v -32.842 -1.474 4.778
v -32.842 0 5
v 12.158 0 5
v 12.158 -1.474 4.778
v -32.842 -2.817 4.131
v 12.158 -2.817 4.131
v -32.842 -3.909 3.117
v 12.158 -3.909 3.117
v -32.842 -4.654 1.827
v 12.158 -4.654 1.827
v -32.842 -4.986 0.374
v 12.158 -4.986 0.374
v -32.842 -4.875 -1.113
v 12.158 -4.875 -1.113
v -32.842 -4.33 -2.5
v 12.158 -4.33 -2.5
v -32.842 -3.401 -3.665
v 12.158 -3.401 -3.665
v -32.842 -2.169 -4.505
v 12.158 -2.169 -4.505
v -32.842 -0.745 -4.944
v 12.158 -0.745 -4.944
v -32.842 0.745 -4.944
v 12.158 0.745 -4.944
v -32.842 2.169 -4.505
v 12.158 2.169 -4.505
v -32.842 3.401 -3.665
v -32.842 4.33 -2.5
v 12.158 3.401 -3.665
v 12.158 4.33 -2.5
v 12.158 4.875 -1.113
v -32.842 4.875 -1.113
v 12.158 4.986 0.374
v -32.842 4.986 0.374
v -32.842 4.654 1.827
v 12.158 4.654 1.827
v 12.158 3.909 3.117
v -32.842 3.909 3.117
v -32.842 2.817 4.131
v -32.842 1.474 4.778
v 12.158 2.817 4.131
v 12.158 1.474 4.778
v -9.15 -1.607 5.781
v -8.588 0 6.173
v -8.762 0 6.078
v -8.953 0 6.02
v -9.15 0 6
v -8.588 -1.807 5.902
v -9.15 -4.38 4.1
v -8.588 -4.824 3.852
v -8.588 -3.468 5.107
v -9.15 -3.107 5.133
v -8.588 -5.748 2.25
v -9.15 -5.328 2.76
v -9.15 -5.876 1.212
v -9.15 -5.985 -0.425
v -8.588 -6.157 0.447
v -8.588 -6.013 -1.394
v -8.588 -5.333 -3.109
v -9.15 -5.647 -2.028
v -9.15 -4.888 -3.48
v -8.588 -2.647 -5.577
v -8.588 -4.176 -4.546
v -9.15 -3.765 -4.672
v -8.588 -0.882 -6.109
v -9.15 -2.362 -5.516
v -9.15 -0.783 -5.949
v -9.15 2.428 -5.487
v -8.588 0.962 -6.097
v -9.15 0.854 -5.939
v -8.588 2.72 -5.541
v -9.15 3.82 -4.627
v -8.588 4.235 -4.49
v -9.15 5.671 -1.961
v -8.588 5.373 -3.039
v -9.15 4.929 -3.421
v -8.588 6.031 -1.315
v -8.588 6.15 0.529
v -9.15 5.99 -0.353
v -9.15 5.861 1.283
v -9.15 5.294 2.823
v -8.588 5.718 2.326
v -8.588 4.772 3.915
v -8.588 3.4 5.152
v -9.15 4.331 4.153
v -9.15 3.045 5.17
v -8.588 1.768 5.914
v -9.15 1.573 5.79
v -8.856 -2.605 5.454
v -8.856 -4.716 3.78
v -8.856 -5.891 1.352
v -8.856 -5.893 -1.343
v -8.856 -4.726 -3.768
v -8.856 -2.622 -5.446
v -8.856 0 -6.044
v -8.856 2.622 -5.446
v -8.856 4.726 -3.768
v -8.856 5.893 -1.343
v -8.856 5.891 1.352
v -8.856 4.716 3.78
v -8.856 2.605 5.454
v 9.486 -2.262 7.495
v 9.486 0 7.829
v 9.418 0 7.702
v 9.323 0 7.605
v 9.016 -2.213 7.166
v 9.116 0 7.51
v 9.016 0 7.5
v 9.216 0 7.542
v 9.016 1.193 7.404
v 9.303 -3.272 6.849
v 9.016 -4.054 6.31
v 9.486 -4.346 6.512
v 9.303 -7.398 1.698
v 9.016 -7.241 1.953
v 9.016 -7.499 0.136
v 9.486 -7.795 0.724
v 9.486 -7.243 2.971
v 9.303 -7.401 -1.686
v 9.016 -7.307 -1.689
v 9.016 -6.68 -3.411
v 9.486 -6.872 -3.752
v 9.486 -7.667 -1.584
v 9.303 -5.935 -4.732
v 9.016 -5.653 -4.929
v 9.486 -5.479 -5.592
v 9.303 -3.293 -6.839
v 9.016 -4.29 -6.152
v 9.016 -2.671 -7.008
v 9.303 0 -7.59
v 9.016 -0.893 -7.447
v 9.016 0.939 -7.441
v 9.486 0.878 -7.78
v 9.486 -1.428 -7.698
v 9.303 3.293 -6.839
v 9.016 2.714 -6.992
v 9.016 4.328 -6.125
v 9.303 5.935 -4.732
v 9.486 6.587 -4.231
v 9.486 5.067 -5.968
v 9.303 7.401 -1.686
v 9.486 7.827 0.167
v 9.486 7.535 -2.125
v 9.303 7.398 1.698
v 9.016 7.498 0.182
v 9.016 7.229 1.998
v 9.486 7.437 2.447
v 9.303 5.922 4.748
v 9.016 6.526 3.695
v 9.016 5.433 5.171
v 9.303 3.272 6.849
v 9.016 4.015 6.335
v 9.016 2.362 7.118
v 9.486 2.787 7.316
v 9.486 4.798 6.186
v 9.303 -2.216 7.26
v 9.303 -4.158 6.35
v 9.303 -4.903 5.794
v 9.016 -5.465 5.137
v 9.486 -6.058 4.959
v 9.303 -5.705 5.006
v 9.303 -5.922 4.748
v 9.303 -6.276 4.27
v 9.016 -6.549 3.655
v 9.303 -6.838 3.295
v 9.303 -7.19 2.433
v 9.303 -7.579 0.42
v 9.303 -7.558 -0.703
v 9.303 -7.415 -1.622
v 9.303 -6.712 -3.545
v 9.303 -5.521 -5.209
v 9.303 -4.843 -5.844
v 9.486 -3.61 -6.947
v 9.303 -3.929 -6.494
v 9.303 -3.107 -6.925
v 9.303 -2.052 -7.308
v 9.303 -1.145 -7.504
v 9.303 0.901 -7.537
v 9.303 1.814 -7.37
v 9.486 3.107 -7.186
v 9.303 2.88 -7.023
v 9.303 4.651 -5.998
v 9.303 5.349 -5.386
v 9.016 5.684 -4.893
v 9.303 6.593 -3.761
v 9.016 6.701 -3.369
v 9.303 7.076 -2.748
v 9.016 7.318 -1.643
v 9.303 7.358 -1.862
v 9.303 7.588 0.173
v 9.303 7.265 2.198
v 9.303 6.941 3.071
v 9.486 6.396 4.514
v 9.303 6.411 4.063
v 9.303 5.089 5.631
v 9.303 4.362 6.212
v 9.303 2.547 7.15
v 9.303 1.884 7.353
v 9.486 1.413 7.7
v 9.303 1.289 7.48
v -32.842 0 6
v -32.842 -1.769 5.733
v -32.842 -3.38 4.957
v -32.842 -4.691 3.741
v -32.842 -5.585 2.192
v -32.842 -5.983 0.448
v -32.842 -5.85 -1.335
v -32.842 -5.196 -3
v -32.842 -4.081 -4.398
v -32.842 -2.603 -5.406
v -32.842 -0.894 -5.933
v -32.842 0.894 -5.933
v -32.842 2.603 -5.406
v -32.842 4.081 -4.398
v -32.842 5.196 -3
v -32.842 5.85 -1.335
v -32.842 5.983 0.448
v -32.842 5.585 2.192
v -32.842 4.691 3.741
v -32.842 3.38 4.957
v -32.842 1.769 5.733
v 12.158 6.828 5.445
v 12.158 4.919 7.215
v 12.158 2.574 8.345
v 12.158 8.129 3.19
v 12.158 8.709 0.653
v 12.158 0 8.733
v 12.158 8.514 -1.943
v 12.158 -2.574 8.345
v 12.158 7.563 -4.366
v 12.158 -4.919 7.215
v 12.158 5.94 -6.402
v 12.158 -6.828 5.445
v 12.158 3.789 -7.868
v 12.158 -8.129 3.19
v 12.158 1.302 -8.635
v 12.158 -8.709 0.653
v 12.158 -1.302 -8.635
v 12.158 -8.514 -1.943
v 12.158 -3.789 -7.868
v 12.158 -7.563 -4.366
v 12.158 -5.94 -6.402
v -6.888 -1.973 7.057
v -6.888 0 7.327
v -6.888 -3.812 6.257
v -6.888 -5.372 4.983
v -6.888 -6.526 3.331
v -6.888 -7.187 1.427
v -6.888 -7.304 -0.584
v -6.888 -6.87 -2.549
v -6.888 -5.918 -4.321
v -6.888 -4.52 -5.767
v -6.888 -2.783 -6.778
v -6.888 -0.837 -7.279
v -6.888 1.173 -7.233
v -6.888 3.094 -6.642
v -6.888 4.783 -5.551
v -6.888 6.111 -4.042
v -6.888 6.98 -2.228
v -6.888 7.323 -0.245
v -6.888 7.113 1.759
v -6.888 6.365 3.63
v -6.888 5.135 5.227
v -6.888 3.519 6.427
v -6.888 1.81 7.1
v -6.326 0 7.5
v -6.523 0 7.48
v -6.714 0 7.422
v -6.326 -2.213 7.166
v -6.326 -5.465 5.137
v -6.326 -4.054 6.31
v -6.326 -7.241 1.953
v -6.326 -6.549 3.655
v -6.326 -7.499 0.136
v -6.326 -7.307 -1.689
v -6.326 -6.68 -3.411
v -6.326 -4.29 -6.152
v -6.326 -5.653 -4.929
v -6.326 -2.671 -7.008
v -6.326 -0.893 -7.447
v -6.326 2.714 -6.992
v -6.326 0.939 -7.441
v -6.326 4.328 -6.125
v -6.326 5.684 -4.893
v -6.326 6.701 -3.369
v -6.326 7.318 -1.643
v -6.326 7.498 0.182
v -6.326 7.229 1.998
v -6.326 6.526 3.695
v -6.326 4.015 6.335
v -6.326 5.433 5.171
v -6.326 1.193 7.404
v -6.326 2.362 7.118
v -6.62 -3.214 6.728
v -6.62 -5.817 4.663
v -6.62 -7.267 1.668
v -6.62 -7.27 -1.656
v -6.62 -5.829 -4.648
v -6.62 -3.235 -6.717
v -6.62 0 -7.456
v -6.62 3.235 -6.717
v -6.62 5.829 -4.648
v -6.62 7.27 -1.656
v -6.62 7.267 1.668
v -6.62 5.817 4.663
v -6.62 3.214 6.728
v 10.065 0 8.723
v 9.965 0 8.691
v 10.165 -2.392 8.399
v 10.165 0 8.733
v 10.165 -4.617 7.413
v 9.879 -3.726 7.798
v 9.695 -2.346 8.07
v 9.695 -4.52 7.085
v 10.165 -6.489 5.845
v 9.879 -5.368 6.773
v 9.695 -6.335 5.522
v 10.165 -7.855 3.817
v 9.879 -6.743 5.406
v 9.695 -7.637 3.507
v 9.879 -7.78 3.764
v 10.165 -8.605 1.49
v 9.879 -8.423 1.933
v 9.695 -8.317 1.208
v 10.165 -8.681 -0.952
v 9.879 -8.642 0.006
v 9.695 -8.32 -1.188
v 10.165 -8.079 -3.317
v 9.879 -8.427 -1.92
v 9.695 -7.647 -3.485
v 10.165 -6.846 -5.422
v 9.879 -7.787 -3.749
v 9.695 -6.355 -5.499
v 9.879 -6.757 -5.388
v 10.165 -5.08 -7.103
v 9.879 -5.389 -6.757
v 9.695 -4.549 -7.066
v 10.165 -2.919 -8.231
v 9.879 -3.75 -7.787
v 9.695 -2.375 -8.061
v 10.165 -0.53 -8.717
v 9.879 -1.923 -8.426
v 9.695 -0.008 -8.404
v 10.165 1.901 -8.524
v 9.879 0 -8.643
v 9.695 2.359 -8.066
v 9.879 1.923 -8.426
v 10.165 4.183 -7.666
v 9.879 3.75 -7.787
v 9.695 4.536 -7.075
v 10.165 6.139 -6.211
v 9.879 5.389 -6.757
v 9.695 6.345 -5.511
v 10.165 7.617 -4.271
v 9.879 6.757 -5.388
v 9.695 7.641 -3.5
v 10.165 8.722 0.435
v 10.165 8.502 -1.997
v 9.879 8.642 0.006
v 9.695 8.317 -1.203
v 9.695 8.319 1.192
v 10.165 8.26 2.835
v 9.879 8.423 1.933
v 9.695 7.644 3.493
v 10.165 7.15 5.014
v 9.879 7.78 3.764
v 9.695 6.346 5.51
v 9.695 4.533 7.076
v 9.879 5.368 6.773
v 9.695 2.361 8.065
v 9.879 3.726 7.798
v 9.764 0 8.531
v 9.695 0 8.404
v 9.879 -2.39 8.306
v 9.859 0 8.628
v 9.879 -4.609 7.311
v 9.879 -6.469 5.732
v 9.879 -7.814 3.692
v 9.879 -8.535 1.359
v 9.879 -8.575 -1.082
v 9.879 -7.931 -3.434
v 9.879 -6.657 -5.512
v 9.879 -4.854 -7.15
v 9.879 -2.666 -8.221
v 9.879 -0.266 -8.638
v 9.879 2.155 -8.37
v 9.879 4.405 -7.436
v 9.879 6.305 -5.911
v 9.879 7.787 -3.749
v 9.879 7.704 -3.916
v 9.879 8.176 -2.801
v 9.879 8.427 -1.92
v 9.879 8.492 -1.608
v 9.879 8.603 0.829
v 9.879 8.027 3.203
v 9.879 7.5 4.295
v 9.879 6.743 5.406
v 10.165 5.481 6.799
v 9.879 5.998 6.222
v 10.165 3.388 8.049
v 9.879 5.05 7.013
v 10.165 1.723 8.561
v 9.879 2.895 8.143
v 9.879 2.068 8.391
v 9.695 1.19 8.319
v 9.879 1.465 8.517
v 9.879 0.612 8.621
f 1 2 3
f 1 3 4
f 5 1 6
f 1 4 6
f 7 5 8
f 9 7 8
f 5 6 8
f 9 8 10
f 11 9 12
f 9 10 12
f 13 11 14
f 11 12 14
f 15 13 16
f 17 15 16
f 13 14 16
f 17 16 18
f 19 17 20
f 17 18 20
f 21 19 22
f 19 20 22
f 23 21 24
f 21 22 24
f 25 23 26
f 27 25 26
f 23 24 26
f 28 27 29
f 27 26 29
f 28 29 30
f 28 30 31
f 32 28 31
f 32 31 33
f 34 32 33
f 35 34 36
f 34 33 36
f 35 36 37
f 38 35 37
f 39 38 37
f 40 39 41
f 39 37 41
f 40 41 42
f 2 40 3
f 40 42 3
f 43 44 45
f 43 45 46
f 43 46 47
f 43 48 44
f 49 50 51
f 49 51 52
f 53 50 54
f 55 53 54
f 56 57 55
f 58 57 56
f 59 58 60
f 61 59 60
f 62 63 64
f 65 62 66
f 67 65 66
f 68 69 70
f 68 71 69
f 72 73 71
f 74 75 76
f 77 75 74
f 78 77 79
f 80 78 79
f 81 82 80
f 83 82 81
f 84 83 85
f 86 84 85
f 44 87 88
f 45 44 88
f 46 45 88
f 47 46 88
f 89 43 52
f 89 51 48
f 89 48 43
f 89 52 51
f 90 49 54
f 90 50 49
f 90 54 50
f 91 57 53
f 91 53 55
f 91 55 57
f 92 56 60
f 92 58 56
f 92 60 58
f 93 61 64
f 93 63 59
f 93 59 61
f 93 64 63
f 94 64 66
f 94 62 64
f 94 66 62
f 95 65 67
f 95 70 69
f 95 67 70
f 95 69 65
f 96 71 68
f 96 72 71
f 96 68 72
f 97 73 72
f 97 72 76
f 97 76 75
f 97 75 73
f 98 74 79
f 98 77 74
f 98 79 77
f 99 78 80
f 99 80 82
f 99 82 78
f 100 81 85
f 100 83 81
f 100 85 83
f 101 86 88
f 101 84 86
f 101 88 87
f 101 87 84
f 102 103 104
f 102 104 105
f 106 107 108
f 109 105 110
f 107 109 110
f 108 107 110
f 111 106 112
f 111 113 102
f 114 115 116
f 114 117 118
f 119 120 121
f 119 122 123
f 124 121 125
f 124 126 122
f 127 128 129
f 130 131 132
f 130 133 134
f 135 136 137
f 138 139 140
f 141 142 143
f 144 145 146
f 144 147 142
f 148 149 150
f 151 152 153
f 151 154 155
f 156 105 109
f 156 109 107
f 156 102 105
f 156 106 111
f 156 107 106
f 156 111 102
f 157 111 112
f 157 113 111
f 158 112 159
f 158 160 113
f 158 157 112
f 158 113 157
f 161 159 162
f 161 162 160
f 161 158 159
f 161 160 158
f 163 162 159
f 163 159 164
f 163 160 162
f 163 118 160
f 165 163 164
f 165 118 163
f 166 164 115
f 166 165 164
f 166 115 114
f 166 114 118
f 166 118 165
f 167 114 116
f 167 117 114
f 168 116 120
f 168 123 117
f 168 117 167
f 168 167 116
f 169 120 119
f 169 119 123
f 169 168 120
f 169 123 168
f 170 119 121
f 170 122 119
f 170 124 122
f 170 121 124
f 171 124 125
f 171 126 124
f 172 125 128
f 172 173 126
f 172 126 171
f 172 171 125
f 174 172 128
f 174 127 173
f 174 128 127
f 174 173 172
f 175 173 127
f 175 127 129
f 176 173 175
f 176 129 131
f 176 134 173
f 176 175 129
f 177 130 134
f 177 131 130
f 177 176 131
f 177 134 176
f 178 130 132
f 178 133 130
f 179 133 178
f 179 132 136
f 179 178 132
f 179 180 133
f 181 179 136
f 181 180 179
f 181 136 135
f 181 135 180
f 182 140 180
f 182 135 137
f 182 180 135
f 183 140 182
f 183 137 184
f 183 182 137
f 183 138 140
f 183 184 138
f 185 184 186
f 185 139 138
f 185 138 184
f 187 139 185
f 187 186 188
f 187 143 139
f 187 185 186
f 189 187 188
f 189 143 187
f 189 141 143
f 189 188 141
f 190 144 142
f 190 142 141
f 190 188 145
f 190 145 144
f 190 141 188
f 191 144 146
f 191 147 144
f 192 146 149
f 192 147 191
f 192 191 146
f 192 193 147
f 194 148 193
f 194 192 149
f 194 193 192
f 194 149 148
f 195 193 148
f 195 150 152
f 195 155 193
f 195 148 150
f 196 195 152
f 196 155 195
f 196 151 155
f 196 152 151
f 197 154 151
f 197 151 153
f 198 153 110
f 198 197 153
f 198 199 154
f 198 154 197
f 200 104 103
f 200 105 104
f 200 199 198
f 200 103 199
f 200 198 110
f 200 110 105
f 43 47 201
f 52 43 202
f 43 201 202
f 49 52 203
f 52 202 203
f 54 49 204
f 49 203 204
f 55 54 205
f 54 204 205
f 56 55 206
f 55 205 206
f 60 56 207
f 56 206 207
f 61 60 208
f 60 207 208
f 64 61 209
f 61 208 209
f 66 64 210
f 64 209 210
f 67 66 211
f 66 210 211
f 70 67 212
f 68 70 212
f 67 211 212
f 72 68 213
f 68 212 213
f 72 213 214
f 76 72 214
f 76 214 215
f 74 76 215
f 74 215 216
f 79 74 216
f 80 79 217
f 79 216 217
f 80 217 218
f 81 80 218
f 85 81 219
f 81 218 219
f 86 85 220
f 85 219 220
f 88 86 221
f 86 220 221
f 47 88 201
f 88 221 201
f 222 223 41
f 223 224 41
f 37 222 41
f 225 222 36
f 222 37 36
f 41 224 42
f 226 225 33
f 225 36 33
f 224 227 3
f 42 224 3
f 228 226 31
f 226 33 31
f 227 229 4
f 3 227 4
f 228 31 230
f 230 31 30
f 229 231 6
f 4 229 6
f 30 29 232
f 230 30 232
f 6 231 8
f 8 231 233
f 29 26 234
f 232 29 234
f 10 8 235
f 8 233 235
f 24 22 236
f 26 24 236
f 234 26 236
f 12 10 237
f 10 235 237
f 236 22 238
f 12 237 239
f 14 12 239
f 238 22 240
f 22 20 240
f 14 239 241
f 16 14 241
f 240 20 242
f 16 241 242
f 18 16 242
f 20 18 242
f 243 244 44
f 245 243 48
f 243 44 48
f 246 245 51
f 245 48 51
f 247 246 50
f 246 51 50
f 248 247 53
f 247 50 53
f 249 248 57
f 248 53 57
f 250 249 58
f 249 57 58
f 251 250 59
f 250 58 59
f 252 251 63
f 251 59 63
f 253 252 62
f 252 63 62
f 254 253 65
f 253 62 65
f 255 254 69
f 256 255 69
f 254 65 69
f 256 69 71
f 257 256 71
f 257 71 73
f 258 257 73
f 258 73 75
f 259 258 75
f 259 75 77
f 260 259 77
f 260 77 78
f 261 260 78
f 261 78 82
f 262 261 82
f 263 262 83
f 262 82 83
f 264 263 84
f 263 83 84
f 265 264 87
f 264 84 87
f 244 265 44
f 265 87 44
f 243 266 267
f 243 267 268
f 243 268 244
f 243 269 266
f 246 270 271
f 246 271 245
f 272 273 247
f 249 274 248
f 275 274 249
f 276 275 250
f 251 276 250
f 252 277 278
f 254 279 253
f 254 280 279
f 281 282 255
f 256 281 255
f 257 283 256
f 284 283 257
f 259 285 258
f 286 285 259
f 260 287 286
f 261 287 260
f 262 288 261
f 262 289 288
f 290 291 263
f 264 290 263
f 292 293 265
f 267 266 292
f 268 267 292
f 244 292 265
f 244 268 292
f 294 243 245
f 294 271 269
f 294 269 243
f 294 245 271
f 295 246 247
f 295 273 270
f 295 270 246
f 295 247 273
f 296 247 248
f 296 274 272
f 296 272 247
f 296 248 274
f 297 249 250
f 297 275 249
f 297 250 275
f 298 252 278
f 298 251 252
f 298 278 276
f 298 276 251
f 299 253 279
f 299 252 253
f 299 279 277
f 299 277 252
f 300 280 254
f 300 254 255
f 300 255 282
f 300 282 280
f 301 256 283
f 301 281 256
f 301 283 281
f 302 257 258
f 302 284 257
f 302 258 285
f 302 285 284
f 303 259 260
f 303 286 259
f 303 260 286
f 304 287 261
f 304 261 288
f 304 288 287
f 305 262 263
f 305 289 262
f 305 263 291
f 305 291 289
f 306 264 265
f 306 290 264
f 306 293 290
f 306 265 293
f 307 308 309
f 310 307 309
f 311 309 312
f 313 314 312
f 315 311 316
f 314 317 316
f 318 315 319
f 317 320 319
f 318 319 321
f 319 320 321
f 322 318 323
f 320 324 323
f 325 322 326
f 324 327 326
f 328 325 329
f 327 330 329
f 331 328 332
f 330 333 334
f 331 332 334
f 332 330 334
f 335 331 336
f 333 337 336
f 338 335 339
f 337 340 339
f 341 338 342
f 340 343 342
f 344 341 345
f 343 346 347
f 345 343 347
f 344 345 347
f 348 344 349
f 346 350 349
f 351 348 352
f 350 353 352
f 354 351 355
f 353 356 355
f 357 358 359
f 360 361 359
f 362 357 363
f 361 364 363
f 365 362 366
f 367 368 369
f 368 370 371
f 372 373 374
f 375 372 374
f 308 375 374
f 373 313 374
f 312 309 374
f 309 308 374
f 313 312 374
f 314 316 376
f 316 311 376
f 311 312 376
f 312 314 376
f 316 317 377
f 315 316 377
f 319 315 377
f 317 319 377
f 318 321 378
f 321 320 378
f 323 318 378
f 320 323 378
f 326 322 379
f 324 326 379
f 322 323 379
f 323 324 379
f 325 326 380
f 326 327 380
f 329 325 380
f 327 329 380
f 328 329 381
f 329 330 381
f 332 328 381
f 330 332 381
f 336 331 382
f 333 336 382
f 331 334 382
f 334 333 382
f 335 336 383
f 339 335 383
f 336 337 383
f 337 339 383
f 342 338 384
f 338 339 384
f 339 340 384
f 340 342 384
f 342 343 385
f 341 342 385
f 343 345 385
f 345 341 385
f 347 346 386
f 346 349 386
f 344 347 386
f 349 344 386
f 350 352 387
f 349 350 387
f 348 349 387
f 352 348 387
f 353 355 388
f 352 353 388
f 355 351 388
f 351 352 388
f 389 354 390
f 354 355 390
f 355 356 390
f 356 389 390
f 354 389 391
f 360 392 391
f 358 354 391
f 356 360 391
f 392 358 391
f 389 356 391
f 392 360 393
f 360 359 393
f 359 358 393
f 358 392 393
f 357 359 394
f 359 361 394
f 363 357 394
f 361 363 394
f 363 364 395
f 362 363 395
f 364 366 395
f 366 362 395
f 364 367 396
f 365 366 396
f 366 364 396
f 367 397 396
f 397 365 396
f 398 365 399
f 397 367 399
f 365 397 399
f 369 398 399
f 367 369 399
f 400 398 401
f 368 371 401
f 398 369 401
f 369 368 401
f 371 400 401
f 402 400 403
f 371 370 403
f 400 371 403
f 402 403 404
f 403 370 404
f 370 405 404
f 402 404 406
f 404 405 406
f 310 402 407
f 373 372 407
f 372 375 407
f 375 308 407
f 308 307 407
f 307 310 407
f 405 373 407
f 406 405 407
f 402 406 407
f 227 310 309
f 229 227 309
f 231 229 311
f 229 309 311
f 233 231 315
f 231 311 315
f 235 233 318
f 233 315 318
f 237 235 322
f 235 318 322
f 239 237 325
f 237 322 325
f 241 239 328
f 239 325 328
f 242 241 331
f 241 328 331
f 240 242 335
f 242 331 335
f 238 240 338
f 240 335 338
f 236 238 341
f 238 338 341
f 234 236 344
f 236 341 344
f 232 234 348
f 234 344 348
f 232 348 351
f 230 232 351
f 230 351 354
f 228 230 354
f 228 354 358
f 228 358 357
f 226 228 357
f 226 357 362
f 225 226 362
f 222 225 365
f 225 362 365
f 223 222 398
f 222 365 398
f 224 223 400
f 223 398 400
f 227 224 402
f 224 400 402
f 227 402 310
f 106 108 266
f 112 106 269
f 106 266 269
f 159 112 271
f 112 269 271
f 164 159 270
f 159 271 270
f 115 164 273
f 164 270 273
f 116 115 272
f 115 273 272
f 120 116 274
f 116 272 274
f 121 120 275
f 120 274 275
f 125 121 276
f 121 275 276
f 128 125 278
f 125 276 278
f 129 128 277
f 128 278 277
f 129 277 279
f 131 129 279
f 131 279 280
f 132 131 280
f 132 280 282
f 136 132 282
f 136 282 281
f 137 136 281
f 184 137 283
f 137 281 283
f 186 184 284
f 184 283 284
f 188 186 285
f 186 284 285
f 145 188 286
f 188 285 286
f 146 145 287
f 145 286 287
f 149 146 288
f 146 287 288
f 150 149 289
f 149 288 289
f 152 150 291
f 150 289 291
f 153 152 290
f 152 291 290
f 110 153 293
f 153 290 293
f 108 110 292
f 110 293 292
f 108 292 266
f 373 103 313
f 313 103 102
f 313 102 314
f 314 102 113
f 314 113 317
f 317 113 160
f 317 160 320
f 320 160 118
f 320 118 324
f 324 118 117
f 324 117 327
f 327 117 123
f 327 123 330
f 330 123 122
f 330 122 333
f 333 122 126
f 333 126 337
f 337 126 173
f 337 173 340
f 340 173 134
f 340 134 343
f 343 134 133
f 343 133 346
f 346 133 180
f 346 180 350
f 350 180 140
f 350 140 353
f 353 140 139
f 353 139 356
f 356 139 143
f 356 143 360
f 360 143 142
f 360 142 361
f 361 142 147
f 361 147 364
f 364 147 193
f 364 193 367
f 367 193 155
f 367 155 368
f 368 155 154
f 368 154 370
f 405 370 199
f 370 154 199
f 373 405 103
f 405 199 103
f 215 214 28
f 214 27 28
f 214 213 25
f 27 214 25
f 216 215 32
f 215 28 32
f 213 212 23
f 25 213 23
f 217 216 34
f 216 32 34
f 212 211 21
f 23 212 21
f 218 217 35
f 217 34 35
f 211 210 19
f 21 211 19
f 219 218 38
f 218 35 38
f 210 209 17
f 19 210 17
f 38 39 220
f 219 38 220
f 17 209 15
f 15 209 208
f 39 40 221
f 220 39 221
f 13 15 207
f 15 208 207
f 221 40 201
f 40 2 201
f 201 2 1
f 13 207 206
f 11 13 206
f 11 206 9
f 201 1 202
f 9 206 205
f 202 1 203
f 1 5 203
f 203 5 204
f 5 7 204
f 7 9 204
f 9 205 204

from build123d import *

# Parameters (mm, degrees)
FILLET_2_R = 0.5
FILLET_3_R = 0.5
FILLET_4_R = 1
FILLET_5_R = 1


with BuildPart() as part:
    # 草图2 → 旋转1 (revolve)
    with BuildSketch(Plane.XY, mode=Mode.PRIVATE) as revolve_1_sk:
        Polygon((-32.84202412, 5), (12.15797588, 5), (12.15797588, 7.5), (12.15797588, 8.732933377), (9.81519701, 8.732933377), (9.36644596, 7.5), (-6.63355404, 7.5), (-8.84202412, 6), (-32.84202412, 6), align=None)
    revolve(revolve_1_sk.sketch.rotate(Axis((-59.135771609, 0, 0), (1, 0, 0)), 90), axis=Axis((-59.135771609, 0, 0), (1, 0, 0)))

    # 圆角2
    fillet_2_edges = [part.edges().sort_by_distance(p)[0] for p in [
        (9.36644596, 0, -7.5),
    ]]
    fillet(fillet_2_edges, radius=FILLET_2_R)

    # 圆角3
    fillet_3_edges = [part.edges().sort_by_distance(p)[0] for p in [
        (9.81519701, 0, -8.732933377),
    ]]
    fillet(fillet_3_edges, radius=FILLET_3_R)

    # 圆角4
    fillet_4_edges = [part.edges().sort_by_distance(p)[0] for p in [
        (-6.63355404, 0, -7.5),
    ]]
    fillet(fillet_4_edges, radius=FILLET_4_R)

    # 圆角5
    fillet_5_edges = [part.edges().sort_by_distance(p)[0] for p in [
        (-8.84202412, 0, -6),
    ]]
    fillet(fillet_5_edges, radius=FILLET_5_R)


solid = part.part
